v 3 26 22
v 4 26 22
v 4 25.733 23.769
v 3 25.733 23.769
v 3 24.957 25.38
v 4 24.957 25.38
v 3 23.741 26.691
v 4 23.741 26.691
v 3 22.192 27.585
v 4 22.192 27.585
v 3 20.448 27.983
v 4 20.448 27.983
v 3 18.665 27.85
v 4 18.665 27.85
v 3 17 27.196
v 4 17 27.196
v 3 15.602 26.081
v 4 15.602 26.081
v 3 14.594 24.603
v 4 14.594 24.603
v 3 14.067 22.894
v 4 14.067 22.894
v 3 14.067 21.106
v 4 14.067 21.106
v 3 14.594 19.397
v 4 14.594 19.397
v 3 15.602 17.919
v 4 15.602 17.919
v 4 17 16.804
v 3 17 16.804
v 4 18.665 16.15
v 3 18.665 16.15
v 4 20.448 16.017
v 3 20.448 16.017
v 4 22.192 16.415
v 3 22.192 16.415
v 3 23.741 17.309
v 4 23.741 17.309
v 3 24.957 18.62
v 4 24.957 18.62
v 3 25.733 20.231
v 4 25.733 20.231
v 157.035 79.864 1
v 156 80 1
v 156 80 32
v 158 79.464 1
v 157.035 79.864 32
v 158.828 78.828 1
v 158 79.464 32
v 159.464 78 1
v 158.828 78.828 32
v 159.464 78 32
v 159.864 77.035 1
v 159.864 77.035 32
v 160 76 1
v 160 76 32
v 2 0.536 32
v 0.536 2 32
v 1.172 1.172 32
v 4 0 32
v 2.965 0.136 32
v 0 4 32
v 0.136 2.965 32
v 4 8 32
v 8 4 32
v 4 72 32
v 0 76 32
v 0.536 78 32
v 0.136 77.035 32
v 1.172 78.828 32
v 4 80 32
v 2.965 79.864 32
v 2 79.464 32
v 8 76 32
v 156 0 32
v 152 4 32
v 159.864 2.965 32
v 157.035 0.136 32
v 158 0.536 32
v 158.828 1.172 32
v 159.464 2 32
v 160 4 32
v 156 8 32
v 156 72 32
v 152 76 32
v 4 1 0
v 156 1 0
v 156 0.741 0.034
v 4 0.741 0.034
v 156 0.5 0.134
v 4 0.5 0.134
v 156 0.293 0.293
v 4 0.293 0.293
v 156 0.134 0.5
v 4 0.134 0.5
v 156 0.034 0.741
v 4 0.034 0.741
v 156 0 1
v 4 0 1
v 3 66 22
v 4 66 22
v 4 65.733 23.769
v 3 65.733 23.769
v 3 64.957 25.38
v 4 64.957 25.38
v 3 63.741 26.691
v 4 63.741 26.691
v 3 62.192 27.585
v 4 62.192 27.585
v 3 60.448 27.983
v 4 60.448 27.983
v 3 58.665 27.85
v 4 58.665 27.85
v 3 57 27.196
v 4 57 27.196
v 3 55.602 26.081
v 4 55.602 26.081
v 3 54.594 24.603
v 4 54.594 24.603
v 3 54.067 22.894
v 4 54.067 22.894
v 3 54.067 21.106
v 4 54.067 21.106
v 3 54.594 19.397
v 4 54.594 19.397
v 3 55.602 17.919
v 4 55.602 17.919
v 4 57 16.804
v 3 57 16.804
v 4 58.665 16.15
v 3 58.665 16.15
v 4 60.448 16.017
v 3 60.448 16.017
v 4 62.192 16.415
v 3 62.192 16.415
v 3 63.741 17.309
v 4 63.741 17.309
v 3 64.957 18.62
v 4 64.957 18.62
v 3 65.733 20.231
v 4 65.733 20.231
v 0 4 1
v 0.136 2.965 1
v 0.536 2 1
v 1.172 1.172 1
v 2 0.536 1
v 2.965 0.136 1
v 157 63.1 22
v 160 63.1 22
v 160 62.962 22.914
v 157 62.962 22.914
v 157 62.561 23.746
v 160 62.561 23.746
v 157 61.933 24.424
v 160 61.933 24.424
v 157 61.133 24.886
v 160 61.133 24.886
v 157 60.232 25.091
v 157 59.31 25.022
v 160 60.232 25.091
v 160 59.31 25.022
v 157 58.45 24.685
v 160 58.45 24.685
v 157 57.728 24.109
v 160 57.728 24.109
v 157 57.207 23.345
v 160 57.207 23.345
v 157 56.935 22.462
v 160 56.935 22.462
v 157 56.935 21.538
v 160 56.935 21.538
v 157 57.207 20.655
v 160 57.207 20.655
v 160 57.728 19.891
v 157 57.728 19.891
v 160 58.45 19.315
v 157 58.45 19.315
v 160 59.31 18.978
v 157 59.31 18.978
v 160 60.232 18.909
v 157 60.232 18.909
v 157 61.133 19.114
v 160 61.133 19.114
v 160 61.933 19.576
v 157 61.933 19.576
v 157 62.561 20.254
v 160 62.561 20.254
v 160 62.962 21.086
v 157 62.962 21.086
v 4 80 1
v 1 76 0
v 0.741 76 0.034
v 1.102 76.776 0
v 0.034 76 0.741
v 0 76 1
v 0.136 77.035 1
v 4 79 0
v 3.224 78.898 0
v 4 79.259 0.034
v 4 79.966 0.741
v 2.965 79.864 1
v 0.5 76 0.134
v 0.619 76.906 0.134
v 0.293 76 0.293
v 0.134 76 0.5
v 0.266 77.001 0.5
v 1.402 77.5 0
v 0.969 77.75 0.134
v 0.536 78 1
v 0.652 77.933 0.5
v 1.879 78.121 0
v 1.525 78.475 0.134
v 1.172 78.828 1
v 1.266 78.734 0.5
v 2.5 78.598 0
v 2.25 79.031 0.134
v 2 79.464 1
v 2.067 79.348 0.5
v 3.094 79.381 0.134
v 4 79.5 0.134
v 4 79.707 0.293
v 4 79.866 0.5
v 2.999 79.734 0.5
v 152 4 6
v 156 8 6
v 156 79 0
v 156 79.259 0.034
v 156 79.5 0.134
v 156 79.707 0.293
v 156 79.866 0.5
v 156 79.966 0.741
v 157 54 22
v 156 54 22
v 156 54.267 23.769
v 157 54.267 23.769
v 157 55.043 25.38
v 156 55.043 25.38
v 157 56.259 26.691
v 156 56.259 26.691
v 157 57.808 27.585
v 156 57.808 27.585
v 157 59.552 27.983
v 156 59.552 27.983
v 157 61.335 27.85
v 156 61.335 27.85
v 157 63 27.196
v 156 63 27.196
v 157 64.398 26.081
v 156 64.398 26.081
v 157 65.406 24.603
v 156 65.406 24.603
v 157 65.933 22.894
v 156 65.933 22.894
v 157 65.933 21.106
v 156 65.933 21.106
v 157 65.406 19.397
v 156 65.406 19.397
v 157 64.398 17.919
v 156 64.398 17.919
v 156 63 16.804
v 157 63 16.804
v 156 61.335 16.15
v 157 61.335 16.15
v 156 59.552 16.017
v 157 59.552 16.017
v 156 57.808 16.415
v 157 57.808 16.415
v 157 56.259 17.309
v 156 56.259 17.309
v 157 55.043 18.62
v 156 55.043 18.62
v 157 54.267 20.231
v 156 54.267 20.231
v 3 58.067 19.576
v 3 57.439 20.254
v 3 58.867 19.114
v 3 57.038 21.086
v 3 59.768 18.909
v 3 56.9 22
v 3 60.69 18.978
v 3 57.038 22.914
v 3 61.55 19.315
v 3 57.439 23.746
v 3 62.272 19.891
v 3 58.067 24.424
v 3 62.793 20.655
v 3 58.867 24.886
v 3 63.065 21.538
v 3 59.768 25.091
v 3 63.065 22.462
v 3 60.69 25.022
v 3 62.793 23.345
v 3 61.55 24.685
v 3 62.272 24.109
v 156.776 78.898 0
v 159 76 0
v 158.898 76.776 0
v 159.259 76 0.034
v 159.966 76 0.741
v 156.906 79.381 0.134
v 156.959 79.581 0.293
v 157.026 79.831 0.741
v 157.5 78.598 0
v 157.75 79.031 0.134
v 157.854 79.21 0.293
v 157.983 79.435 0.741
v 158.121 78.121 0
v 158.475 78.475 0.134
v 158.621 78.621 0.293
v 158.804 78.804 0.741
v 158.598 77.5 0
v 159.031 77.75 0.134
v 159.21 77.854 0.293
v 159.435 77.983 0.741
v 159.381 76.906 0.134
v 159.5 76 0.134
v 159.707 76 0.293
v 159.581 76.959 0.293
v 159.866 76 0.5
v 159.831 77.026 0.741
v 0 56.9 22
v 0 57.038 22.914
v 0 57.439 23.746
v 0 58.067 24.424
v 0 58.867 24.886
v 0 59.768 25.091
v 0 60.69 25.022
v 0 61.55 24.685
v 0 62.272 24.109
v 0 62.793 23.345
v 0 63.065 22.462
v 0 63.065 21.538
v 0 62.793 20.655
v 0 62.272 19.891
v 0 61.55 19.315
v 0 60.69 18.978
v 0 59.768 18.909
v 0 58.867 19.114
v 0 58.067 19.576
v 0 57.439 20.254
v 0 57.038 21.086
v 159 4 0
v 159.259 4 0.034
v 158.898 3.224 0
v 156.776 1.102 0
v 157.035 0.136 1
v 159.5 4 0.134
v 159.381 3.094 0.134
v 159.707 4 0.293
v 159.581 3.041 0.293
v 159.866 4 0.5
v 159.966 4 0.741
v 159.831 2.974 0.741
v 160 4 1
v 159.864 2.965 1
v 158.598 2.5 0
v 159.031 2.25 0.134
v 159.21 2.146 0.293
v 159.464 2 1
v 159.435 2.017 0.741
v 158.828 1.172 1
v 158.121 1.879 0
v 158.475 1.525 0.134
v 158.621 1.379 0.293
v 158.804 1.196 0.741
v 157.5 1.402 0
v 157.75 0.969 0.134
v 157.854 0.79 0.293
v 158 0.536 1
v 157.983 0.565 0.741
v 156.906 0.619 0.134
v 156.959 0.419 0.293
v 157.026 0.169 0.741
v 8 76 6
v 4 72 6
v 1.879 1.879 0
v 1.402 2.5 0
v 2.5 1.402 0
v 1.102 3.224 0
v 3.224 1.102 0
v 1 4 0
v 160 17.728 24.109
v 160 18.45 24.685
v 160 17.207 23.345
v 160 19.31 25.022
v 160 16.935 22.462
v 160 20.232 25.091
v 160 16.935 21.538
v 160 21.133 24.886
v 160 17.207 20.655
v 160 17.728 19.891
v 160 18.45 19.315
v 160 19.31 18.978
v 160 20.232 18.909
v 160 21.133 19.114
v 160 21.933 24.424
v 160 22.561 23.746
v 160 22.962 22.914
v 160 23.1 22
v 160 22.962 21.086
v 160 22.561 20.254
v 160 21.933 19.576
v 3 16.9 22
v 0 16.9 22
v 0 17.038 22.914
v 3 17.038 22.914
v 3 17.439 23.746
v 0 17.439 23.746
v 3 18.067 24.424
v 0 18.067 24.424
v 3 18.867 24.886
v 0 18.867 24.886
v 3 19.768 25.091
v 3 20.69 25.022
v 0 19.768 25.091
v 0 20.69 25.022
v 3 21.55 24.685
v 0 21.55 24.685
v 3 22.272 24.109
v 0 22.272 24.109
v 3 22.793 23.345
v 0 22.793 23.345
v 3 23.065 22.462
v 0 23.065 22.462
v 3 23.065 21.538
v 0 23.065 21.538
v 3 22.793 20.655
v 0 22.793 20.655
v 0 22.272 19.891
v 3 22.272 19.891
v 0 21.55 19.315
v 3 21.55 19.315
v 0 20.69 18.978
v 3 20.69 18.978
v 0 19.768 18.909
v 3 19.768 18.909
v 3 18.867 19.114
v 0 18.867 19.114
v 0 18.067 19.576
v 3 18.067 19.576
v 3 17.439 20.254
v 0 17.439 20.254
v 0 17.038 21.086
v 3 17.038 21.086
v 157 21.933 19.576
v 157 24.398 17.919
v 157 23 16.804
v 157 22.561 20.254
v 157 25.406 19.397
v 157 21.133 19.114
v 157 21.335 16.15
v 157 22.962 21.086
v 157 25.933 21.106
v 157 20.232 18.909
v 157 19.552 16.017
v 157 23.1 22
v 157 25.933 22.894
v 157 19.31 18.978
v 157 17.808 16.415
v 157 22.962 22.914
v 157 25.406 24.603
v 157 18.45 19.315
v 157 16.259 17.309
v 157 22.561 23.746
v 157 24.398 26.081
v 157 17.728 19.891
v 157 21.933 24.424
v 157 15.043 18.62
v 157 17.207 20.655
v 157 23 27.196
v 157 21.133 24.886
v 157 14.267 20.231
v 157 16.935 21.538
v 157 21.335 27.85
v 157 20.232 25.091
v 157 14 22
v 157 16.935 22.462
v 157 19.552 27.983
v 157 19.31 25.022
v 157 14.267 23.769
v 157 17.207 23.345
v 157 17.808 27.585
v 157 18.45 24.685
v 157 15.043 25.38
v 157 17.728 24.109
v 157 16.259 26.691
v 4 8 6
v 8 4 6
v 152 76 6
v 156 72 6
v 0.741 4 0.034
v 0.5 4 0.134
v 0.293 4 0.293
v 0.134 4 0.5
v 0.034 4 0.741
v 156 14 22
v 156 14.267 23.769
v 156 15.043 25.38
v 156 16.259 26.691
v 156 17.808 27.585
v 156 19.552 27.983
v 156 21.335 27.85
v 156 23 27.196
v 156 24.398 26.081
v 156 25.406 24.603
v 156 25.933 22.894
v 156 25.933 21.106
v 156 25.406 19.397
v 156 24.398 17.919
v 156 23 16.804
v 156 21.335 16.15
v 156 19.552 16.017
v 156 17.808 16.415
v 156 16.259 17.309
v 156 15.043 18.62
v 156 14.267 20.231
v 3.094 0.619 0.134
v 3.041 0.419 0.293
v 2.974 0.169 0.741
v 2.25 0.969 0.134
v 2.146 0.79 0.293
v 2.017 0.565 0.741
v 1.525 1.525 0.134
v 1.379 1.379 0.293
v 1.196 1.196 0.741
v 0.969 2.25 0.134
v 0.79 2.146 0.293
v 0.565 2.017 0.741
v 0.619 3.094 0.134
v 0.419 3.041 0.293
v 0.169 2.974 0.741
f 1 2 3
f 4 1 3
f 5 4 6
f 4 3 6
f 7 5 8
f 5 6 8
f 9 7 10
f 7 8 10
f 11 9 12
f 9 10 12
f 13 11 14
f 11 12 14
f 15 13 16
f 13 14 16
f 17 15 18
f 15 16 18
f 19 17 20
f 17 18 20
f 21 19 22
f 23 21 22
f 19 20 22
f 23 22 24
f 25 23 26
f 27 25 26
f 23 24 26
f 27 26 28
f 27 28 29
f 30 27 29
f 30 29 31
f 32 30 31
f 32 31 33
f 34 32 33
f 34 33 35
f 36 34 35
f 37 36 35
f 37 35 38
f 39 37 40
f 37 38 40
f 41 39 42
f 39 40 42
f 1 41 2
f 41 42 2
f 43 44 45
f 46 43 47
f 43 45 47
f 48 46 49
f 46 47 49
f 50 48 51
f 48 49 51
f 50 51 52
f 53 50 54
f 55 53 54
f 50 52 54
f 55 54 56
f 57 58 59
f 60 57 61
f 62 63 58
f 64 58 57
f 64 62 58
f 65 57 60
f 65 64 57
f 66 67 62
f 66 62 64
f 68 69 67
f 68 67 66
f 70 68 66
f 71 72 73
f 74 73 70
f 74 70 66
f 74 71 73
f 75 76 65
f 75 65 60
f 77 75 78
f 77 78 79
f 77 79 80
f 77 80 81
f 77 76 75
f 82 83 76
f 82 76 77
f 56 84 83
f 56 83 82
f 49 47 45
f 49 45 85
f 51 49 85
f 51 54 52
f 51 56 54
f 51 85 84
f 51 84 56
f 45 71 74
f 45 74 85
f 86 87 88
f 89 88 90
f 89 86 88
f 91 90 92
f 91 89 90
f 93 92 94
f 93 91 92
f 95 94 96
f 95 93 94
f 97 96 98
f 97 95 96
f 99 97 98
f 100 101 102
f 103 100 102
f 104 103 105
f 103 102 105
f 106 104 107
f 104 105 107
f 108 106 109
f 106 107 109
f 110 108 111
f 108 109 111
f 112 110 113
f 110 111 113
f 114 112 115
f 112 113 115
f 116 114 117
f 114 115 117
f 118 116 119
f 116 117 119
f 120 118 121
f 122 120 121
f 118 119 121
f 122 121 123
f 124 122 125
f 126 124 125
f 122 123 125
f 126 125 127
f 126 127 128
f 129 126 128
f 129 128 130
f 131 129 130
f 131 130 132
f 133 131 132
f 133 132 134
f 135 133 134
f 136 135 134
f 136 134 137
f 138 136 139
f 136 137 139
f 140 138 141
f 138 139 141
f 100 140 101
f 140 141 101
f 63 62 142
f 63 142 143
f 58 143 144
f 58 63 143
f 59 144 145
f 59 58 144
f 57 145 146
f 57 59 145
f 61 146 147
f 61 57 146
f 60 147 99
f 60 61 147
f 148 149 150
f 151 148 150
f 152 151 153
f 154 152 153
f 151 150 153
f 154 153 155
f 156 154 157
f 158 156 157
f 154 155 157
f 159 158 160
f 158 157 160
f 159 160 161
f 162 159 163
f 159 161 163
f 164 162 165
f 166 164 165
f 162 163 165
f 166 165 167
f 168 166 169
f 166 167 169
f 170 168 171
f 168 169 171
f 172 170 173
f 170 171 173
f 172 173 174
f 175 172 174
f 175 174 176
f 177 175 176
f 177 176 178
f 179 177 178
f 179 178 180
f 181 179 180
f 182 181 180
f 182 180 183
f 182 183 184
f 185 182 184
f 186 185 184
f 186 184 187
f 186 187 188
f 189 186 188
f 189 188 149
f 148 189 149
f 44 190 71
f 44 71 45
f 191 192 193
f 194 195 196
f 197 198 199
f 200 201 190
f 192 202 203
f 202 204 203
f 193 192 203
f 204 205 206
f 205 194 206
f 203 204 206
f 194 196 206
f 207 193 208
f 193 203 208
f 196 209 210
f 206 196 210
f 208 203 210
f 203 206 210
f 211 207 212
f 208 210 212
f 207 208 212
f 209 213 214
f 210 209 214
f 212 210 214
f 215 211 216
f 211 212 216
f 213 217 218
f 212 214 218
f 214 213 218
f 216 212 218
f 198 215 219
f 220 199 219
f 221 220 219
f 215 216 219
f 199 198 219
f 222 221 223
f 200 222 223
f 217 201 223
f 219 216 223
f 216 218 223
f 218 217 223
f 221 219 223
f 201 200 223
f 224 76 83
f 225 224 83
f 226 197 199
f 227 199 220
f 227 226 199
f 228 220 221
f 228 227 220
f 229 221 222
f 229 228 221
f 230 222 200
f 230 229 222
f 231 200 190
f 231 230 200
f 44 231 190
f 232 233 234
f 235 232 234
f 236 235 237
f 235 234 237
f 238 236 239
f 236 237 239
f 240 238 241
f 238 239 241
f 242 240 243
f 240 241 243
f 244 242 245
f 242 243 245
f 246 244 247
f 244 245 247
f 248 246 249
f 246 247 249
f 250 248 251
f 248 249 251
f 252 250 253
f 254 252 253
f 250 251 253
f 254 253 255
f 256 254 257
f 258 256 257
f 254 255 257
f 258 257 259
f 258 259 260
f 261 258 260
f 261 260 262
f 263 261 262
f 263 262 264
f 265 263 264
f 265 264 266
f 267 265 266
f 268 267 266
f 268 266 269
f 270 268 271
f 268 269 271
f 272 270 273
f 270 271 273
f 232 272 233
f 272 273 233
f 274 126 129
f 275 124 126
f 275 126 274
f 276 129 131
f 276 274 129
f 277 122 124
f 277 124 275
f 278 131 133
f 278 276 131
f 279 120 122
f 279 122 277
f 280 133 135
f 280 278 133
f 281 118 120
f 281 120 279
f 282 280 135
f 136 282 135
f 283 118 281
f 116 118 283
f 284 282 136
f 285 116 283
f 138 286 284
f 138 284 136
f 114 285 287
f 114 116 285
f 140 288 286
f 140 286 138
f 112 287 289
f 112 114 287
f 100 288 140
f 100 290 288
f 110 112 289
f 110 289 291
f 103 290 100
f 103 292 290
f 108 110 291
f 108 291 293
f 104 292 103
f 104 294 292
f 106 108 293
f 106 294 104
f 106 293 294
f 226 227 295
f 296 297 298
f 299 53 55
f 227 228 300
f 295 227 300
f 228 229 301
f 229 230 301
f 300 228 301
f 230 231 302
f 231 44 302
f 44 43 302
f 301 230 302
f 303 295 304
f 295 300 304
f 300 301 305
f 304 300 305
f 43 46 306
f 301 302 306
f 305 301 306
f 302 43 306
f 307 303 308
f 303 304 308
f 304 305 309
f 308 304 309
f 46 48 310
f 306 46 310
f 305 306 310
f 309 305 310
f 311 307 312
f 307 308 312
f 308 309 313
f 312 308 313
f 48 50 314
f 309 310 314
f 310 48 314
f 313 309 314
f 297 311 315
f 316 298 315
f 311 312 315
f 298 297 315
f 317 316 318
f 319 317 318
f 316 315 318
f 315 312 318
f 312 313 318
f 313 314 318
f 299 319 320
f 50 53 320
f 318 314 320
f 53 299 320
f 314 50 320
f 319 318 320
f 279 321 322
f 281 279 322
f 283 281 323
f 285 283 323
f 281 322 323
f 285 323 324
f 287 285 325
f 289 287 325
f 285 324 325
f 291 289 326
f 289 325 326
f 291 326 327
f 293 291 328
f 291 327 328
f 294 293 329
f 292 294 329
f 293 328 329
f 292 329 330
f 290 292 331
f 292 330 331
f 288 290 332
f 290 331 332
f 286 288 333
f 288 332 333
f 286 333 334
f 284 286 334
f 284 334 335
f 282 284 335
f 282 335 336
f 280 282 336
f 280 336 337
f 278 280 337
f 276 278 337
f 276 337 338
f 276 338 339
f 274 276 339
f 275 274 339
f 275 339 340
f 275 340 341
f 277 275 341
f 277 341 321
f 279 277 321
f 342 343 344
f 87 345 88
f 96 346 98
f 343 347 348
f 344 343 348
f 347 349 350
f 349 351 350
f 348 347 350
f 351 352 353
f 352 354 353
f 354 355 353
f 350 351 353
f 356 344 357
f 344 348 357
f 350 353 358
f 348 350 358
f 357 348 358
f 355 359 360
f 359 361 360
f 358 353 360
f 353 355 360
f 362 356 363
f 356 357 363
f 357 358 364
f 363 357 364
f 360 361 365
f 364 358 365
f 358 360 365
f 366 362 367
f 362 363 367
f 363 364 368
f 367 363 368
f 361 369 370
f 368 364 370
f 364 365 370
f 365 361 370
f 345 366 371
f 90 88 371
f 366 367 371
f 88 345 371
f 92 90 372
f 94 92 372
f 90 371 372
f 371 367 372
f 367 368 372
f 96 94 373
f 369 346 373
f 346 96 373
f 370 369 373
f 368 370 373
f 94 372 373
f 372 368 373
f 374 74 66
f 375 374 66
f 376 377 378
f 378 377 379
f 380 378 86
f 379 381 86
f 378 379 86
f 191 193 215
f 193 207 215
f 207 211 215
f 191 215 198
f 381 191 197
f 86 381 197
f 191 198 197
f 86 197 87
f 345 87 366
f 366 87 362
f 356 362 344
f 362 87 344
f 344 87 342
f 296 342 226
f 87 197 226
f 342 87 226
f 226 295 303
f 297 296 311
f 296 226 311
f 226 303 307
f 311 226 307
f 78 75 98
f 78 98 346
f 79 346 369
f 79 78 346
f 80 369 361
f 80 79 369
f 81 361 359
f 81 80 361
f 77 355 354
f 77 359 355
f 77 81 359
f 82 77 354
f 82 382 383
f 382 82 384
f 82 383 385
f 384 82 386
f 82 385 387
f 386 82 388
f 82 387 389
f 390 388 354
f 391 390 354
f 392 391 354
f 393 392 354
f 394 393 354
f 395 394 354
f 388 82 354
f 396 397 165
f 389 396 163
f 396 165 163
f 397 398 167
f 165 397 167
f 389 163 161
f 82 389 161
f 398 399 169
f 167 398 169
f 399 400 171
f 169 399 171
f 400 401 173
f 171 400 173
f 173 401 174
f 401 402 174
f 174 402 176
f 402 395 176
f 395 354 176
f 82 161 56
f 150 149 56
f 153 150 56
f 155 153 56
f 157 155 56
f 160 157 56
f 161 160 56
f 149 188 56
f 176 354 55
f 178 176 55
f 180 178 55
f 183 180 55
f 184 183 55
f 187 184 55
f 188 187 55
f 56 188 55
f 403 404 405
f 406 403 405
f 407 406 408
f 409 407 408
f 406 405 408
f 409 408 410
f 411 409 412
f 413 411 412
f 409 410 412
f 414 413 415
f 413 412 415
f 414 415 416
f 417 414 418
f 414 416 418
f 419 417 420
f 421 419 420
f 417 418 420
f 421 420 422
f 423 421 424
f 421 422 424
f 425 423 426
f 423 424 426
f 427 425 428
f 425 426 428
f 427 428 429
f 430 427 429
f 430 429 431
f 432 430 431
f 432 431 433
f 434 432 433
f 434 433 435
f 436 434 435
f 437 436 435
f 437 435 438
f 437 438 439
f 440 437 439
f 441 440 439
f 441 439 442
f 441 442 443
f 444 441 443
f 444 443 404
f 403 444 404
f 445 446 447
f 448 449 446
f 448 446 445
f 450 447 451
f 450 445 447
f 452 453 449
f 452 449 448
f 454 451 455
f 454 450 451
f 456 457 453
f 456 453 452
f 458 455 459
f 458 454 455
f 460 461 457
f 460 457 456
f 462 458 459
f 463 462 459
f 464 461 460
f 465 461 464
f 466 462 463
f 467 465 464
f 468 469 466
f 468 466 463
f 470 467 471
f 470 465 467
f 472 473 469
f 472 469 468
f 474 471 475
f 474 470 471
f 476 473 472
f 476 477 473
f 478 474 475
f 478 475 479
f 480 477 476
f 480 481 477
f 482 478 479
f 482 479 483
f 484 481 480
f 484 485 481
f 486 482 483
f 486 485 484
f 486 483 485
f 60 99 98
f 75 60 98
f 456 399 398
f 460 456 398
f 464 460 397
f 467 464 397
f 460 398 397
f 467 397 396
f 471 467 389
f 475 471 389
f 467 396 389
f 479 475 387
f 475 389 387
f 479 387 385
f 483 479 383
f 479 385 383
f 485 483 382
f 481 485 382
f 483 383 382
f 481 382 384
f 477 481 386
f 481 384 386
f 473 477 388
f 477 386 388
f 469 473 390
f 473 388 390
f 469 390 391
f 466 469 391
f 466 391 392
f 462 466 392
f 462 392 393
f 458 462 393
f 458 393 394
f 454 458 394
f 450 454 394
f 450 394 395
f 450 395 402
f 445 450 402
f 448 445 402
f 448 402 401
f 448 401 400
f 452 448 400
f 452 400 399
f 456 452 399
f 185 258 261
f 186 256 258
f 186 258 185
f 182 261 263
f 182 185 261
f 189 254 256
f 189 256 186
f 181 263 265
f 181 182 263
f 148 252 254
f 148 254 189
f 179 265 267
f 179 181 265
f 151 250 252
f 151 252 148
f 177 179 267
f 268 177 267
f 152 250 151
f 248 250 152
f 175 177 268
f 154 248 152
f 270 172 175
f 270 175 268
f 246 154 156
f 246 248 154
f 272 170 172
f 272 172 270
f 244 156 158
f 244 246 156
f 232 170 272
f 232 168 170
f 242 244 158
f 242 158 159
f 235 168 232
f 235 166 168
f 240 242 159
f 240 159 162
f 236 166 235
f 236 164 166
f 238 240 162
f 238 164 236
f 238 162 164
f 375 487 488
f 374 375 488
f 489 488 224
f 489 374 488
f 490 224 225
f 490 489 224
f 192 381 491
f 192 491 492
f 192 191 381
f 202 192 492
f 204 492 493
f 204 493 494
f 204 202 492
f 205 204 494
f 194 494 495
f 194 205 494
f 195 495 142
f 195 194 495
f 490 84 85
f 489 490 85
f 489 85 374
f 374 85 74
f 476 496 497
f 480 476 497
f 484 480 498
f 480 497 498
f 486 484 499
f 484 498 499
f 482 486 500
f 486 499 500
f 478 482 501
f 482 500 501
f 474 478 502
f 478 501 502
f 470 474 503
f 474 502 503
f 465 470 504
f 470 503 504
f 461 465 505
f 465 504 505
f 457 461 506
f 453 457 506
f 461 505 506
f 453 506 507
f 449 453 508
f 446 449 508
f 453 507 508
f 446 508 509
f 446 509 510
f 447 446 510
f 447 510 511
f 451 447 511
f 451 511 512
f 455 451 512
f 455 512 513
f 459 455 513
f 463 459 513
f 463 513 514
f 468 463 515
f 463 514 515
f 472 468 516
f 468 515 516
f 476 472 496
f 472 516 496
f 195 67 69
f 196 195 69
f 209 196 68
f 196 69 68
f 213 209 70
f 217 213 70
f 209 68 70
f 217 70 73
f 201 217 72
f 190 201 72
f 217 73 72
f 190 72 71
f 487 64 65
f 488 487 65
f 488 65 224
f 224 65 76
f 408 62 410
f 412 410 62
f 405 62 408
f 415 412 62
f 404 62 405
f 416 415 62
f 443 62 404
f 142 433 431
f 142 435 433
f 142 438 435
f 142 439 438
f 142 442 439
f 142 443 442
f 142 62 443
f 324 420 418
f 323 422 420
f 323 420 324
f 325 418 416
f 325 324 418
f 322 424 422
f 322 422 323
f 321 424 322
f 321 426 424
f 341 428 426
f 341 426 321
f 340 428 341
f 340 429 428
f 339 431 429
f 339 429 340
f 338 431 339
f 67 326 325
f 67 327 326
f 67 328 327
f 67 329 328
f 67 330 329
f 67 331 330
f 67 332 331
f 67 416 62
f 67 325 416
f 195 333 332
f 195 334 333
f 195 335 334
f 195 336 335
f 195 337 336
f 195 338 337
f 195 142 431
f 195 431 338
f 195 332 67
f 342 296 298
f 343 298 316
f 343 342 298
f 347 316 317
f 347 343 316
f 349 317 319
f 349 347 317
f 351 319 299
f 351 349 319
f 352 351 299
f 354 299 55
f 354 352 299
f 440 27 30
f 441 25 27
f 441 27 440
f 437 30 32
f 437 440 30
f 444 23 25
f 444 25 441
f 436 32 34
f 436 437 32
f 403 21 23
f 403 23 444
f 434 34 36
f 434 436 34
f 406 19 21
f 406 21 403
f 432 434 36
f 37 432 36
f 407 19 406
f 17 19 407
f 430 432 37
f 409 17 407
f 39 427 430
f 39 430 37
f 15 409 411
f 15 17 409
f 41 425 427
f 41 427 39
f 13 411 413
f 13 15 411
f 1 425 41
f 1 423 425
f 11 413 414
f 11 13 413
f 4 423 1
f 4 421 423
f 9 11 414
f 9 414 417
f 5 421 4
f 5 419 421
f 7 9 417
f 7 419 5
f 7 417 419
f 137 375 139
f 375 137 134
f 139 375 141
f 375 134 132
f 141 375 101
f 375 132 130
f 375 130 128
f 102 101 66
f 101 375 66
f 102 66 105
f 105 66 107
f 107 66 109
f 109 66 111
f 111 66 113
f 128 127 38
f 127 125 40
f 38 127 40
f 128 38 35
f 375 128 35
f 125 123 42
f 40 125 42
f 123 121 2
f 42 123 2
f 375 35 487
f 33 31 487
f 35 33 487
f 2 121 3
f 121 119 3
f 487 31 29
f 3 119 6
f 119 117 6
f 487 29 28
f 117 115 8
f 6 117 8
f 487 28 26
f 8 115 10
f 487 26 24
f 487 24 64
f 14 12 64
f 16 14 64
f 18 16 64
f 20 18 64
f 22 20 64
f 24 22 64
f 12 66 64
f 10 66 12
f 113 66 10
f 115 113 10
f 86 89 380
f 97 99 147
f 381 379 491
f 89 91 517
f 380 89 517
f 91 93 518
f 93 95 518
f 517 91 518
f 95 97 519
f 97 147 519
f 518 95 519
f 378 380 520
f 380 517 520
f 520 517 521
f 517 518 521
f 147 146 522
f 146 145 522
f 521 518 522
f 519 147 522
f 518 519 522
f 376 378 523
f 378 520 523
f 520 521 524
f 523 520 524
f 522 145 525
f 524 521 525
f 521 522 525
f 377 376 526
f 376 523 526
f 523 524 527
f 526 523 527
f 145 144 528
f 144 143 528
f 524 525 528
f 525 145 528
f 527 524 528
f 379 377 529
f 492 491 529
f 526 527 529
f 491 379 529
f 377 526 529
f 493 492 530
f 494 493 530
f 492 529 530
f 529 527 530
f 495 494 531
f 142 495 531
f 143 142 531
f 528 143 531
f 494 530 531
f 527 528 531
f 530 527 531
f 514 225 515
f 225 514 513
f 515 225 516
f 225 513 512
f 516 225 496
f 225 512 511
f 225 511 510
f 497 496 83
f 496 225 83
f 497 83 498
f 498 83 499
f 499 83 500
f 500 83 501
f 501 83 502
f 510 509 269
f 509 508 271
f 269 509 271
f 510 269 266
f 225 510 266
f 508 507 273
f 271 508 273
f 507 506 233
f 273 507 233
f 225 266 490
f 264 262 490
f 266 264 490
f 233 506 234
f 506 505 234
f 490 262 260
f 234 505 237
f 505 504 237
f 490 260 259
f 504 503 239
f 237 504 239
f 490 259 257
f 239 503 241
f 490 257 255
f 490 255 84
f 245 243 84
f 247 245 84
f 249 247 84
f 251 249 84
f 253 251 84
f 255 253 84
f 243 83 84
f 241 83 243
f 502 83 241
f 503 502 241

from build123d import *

# Parameters (mm, degrees)
SKETCH_W        = 160
SKETCH_H        = 80
PAD_DEPTH       = 32
POCKET_DEPTH    = 26
SKETCH002_R     = 6
POCKET001_DEPTH = 1
SKETCH003_R     = 6
POCKET002_DEPTH = 1
SKETCH004_R     = 3.1
POCKET003_DEPTH = 4
SKETCH005_R     = 3.1
POCKET004_DEPTH = 4
FILLET_R        = 4
FILLET001_R     = 1


with BuildPart() as part:
    # Sketch → Pad (new body)
    with BuildSketch(Plane.XY):
        with Locations((80, 40)):
            Rectangle(SKETCH_W, SKETCH_H)
    extrude(amount=PAD_DEPTH)

    # Sketch001 (on Face6 of Pad) → Pocket (cut)
    with BuildSketch(Plane.XY.offset(32)):
        Polygon((8, 76), (4, 72), (4, 8), (8, 4), (152, 4), (156, 8), (156, 72), (152, 76), align=None)
    extrude(amount=-POCKET_DEPTH, mode=Mode.SUBTRACT)

    # Sketch002 (on Face7 of Pocket) → Pocket001 (cut)
    with BuildSketch(Plane.YZ.offset(4)):
        with Locations((20, 22)):
            Circle(SKETCH002_R)
        with Locations((60, 22)):
            Circle(SKETCH002_R)
    extrude(amount=-POCKET001_DEPTH, mode=Mode.SUBTRACT)

    # Sketch003 (on Face11 of Pocket001) → Pocket002 (cut)
    with BuildSketch(Plane(origin=(156, 0, 0), x_dir=(0, -1, 0), z_dir=(-1, 0, 0))):
        with Locations((-20, 22)):
            Circle(SKETCH003_R)
        with Locations((-60, 22)):
            Circle(SKETCH003_R)
    extrude(amount=-POCKET002_DEPTH, mode=Mode.SUBTRACT)

    # Sketch004 (on Face3 of Pocket002) → Pocket003 (cut)
    with BuildSketch(Plane.YZ.offset(160)):
        with Locations((20, 22)):
            Circle(SKETCH004_R)
        with Locations((60, 22)):
            Circle(SKETCH004_R)
    extrude(amount=-POCKET003_DEPTH, mode=Mode.SUBTRACT)

    # Sketch005 (on Face2 of Pocket003) → Pocket004 (cut)
    with BuildSketch(Plane(origin=(0, 0, 0), x_dir=(0, -1, 0), z_dir=(-1, 0, 0))):
        with Locations((-60, 22)):
            Circle(SKETCH005_R)
        with Locations((-20, 22)):
            Circle(SKETCH005_R)
    extrude(amount=-POCKET004_DEPTH, mode=Mode.SUBTRACT)

    # Fillet
    fillet_edges = [part.edges().sort_by_distance(p)[0] for p in [
        (160, 80, 16),
        (0, 80, 16),
        (0, 0, 16),
        (160, 0, 16),
    ]]
    fillet(fillet_edges, radius=FILLET_R)

    # Fillet001
    fillet001_edges = [part.edges().sort_by_distance(p)[0] for p in [
        (1.171573, 78.828427, 0),
        (0, 40, 0),
        (80, 80, 0),
        (1.171573, 1.171573, 0),
        (80, 0, 0),
        (158.828427, 1.171573, 0),
        (160, 40, 0),
        (158.828427, 78.828427, 0),
    ]]
    fillet(fillet001_edges, radius=FILLET001_R)


solid = part.part
